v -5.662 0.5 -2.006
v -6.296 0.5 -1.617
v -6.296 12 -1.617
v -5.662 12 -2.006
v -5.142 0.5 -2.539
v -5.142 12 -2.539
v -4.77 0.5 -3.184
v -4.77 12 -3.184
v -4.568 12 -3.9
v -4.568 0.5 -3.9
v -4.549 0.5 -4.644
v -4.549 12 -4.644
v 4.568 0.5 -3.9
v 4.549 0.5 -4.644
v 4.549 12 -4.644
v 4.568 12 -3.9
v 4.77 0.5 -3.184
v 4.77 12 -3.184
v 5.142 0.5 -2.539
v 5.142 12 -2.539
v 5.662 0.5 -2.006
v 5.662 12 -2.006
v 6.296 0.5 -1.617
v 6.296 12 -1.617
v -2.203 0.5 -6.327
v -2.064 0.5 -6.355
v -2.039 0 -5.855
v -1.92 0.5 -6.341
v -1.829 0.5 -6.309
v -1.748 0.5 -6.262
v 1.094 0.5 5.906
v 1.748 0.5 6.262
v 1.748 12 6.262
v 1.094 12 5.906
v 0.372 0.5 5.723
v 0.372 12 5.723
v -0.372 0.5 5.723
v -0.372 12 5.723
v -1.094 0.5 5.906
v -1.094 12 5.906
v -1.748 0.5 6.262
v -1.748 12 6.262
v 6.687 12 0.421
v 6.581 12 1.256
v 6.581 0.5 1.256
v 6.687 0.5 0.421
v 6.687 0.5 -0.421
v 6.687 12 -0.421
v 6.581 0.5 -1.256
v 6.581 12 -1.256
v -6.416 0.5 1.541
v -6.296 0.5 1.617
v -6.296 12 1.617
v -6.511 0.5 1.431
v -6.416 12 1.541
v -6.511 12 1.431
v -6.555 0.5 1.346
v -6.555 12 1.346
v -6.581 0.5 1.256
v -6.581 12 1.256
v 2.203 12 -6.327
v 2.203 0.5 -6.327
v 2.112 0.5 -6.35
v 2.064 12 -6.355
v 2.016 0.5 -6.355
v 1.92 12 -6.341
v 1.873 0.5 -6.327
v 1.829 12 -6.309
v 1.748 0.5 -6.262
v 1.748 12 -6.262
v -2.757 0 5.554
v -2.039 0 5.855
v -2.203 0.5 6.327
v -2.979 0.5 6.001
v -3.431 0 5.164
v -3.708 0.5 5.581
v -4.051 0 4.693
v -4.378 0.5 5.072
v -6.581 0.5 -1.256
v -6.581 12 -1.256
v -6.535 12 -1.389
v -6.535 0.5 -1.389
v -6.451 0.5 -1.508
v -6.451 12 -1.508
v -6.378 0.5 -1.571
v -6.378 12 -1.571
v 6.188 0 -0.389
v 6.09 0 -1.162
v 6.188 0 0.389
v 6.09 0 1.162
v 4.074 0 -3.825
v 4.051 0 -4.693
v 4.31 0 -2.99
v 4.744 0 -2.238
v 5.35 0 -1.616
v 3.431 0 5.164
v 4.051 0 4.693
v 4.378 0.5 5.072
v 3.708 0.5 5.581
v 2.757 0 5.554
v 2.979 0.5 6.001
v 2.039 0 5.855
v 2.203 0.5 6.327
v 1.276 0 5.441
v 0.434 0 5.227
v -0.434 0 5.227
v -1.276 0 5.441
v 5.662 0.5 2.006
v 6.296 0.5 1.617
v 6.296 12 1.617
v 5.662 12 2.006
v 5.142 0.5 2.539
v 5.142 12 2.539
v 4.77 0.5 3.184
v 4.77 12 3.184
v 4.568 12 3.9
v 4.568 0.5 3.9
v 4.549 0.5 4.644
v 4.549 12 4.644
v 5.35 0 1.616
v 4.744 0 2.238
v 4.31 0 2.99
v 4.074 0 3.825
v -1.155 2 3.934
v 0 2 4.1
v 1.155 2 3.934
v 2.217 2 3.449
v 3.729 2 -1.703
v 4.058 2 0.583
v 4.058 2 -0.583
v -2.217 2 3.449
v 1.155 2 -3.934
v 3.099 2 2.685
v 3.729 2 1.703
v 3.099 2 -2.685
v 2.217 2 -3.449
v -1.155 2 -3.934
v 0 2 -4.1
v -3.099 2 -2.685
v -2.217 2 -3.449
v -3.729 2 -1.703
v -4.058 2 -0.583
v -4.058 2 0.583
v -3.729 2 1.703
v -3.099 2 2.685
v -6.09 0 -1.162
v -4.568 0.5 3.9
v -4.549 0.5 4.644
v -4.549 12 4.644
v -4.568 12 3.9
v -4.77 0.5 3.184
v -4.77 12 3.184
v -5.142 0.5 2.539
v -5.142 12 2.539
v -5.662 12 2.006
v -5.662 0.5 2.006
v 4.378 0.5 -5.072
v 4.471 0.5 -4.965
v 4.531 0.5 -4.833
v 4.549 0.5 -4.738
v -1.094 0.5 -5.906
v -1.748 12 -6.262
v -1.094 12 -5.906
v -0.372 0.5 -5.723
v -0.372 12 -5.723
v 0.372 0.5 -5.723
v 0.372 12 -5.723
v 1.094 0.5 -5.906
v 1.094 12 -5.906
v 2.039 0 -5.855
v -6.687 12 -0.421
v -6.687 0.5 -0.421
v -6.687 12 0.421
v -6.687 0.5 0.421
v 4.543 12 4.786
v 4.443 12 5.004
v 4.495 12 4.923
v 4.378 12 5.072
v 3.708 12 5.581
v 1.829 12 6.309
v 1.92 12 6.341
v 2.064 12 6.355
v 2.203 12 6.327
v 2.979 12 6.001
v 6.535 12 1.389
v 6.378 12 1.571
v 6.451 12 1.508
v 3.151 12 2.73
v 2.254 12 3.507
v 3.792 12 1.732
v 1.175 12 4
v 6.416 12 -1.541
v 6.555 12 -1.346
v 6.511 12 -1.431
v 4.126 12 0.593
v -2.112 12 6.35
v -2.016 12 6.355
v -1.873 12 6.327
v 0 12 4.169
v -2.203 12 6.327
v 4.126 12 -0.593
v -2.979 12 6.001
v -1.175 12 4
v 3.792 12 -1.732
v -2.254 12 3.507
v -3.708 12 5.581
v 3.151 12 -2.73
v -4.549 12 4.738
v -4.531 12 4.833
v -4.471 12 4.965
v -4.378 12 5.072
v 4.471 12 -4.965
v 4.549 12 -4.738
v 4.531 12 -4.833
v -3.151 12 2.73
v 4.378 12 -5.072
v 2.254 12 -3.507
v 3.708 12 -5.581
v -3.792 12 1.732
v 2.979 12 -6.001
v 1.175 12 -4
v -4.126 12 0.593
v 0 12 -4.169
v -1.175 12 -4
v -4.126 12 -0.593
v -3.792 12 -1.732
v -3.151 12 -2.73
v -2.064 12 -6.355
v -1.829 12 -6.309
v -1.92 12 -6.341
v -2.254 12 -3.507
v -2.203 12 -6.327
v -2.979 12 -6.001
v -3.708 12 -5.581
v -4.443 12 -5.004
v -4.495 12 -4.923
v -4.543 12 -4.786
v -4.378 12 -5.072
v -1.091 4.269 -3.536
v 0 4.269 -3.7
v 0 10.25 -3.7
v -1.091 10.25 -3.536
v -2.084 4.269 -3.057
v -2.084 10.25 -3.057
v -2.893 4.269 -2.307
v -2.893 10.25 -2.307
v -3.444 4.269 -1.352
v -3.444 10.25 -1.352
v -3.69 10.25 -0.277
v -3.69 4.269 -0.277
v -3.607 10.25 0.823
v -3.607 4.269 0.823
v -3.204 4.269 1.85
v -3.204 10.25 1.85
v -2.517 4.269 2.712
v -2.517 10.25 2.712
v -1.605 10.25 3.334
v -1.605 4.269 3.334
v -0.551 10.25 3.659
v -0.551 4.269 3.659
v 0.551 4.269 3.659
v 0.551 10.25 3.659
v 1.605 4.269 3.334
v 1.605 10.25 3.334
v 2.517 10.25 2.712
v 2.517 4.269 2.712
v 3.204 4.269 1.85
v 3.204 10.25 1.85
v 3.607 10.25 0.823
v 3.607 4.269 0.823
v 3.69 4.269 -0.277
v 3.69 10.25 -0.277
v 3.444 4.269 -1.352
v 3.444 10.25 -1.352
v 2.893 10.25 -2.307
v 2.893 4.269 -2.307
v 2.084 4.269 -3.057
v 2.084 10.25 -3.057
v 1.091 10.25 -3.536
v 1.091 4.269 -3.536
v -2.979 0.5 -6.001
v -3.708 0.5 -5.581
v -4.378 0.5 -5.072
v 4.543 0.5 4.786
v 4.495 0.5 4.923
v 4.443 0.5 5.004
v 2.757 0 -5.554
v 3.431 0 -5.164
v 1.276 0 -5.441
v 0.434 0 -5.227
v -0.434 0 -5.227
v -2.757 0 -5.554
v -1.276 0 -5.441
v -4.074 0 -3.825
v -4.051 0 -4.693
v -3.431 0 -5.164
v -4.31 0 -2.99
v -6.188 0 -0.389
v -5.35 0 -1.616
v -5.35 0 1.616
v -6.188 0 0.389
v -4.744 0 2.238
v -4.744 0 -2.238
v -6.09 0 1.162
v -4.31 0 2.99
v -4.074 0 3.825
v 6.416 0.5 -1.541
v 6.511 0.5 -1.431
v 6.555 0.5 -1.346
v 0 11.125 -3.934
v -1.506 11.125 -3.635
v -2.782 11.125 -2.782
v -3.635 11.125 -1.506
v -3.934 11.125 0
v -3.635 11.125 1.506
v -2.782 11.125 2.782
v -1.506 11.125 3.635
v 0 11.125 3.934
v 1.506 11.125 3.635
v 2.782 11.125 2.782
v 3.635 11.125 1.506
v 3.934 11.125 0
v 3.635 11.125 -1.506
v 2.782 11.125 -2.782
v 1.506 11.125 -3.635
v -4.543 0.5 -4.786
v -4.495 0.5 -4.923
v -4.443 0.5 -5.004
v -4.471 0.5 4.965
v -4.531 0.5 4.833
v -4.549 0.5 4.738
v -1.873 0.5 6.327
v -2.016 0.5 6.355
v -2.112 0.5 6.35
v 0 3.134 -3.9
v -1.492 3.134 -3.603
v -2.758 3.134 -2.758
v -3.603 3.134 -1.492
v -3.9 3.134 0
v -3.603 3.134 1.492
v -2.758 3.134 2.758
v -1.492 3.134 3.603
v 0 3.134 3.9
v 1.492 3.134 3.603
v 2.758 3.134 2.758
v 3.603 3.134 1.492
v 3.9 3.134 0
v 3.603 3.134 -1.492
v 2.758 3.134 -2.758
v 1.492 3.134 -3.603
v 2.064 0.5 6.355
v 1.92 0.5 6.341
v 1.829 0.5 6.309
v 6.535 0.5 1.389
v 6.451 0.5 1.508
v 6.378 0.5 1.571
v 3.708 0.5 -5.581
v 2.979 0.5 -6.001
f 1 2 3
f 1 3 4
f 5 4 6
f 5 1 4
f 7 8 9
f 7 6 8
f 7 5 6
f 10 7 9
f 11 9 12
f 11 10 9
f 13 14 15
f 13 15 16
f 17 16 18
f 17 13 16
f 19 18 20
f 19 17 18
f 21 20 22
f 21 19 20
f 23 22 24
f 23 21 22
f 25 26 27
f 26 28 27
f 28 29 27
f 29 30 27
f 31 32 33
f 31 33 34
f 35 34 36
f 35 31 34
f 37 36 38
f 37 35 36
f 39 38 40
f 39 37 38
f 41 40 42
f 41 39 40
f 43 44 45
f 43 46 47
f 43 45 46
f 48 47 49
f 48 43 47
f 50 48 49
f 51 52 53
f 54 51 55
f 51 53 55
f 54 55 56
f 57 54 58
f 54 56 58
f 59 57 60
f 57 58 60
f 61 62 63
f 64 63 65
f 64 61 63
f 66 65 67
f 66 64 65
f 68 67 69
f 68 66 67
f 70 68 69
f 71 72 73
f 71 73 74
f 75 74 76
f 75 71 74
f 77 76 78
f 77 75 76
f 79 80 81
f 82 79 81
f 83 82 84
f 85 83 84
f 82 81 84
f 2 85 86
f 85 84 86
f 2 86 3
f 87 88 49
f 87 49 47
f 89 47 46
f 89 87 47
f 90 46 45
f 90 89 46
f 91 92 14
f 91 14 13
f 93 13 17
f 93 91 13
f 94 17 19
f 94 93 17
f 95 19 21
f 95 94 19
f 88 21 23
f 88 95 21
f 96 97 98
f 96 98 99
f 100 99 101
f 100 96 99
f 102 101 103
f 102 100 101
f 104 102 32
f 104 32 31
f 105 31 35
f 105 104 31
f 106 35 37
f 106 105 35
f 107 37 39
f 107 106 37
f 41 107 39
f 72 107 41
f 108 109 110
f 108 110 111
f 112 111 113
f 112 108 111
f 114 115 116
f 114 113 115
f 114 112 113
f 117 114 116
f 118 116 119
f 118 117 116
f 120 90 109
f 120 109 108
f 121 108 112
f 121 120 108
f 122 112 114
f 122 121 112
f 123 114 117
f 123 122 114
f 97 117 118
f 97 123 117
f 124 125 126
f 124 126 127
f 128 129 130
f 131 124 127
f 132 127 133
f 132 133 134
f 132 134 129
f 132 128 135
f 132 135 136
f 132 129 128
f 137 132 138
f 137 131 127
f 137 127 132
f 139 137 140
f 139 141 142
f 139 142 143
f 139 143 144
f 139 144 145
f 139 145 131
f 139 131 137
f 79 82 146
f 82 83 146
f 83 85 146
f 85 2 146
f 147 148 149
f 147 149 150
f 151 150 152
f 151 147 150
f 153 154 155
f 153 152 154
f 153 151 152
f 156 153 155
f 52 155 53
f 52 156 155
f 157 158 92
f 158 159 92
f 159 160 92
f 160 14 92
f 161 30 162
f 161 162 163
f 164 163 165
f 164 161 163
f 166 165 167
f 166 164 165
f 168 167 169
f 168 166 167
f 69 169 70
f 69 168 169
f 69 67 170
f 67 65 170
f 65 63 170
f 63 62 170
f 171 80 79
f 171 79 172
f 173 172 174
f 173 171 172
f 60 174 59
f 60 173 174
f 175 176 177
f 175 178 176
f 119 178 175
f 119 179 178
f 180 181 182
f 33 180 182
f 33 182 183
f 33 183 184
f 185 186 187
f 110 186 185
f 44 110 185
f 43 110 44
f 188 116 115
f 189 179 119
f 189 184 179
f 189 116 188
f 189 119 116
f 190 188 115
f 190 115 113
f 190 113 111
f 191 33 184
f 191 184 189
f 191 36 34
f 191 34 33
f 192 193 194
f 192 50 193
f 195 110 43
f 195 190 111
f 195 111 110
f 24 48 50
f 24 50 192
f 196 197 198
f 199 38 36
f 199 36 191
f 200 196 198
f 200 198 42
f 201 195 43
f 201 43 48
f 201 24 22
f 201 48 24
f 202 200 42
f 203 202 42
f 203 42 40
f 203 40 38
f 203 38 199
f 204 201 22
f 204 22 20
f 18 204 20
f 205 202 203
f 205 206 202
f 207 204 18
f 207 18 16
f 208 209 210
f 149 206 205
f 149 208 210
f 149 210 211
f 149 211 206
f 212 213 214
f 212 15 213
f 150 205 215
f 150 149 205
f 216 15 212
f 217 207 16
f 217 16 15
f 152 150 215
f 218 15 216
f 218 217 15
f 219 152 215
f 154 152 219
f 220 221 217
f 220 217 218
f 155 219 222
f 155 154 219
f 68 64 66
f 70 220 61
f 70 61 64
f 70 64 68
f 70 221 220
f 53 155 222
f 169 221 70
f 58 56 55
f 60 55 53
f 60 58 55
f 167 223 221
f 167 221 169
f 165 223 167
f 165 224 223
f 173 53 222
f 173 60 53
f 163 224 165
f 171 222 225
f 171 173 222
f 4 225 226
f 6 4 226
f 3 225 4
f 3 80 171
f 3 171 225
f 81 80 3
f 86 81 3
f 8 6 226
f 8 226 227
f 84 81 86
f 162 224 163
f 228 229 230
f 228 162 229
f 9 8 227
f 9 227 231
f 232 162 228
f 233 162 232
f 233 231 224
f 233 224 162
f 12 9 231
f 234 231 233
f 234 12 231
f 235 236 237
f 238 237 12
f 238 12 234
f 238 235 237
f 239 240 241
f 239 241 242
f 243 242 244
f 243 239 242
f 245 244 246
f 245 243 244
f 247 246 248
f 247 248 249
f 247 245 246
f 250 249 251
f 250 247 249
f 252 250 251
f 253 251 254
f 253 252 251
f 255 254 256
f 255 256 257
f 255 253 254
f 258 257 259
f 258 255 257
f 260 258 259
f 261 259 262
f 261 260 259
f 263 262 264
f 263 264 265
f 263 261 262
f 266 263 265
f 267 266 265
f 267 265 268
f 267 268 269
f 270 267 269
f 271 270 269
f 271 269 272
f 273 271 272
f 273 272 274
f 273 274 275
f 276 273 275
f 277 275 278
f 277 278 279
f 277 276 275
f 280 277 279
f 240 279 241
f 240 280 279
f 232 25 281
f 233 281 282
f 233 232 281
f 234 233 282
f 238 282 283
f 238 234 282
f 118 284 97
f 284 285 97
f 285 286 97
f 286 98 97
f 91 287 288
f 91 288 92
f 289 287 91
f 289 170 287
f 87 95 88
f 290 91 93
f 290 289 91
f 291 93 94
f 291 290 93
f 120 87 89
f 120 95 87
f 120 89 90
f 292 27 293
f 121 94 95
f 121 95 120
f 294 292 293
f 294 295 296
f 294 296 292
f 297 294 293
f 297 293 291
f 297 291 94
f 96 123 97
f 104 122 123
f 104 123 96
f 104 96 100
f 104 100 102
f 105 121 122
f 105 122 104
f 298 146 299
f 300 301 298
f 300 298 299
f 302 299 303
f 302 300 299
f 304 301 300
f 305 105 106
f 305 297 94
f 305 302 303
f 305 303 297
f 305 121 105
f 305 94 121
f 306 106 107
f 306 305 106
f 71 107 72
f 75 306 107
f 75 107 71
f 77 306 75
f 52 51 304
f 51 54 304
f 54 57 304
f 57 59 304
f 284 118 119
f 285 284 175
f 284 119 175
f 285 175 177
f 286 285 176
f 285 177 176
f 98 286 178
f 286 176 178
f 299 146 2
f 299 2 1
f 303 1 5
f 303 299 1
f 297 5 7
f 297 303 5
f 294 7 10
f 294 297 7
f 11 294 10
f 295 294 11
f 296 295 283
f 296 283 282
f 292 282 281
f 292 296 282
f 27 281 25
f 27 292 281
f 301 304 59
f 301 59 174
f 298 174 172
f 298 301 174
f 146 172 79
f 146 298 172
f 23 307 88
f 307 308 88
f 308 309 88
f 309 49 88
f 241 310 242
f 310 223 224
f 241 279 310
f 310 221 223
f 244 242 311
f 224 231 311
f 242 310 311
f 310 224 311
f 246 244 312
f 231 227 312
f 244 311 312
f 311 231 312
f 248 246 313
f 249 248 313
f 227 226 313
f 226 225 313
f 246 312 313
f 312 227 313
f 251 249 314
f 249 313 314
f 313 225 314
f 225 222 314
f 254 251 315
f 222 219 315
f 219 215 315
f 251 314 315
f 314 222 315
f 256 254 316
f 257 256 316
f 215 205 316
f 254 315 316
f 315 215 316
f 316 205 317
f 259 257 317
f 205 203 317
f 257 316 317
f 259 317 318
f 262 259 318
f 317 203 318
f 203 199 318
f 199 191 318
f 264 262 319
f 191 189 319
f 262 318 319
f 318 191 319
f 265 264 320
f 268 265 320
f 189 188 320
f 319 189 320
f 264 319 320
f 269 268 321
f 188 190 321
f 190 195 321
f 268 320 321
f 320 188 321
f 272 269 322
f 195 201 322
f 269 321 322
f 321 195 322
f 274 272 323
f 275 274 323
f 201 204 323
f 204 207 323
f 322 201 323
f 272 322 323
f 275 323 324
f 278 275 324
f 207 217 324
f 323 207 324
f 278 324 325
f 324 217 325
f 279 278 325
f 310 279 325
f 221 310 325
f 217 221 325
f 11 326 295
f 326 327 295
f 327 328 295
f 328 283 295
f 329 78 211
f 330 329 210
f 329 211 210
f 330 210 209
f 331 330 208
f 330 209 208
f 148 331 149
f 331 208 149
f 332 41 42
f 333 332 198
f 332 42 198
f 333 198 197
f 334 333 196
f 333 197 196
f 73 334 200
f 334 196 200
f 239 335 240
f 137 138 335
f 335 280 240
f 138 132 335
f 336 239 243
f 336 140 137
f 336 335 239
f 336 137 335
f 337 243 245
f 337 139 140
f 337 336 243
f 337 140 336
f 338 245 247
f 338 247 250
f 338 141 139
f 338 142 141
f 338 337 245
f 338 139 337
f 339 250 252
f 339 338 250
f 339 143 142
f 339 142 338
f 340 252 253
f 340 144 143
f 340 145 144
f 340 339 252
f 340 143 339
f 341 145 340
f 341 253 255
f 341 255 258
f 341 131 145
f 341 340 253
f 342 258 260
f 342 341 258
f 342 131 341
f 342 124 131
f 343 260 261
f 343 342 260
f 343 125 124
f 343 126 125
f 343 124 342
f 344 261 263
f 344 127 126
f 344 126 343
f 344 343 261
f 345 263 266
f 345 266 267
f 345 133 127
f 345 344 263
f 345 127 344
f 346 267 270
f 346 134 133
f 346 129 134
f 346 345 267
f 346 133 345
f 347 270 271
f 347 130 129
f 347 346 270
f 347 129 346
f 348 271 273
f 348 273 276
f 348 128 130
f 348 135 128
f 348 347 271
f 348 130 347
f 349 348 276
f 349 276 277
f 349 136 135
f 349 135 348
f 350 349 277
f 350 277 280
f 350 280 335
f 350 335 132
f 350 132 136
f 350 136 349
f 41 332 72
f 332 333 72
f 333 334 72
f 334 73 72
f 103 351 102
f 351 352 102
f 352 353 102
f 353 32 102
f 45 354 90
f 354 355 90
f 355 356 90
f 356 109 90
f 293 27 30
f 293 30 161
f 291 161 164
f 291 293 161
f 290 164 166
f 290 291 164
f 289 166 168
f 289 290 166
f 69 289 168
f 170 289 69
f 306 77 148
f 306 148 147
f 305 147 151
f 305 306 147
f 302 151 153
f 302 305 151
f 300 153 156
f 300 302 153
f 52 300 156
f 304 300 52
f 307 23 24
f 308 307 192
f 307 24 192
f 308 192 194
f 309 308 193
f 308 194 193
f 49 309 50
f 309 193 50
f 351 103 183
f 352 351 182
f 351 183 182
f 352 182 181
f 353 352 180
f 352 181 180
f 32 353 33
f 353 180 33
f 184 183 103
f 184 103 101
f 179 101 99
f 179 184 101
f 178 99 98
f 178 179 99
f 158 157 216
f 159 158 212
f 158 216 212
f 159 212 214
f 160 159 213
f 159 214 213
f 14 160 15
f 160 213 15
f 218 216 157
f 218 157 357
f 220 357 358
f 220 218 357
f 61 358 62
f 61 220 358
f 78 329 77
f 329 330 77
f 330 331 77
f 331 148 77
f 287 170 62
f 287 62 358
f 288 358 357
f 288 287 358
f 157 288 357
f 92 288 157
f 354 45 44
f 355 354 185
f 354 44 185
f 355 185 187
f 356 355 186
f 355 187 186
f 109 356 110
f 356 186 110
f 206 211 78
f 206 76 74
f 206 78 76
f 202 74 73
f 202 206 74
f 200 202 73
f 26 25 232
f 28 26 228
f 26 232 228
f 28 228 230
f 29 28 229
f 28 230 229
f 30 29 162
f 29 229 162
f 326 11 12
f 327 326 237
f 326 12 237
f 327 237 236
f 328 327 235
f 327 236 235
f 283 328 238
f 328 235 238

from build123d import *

# Parameters (mm, degrees)
CHAMFER1_SIZE      = 1.75
CHAMFER1_SIZE2     = 0.468911087
SKETCH2_R          = 3
CUT_EXTRUDE1_DEPTH = 16.289865925
CIRPATTERN1_COUNT  = 6
FILLET1_R          = 0.5
CHAMFER2_SIZE      = 0.5


with BuildPart() as part:
    # Sketch1 → Revolve1 (revolve)
    with BuildSketch(Plane(origin=(0, 0, 0), x_dir=(0, 0, -1), z_dir=(1, 0, 0)), mode=Mode.PRIVATE) as revolve1_sk:
        Polygon((0, 0), (-6.7, 0), (-6.7, 12), (-3.7, 12), (-3.7, 4.268512728), (-4.1, 2), (0, 2), align=None)
    revolve(revolve1_sk.sketch.rotate(Axis((0, 0, 0), (0, 1, 0)), 180), axis=Axis((0, 0, 0), (0, 1, 0)))

    # Chamfer1
    chamfer1_edges = [part.edges().sort_by_distance(p)[0] for p in [
        (0, 12, 3.7),
    ]]
    chamfer1_side = [part.faces().sort_by_distance(p)[0] for p in [
        (0, 8.134256364, 3.7),
    ]]
    chamfer(chamfer1_edges, length=CHAMFER1_SIZE, length2=CHAMFER1_SIZE2, reference=chamfer1_side[0])

    # Sketch2 → Cut-Extrude1 (cut, through all)
    with BuildSketch(Plane(origin=(0, 0, 0), x_dir=(1, 0, 0), z_dir=(0, 1, 0))):
        with Locations((0, 8.7)):
            Circle(SKETCH2_R)
    cut_extrude1 = extrude(amount=CUT_EXTRUDE1_DEPTH, mode=Mode.SUBTRACT)

    # CirPattern1: Cut-Extrude1 ×6 about axis
    cirpattern1_axis = Axis((0, 0, 0), (0, 1, 0))
    for i in range(1, CIRPATTERN1_COUNT):
        add(cut_extrude1.rotate(cirpattern1_axis, i * 360 / CIRPATTERN1_COUNT), mode=Mode.SUBTRACT)

    # Fillet1
    fillet1_edges = [part.edges().sort_by_distance(p)[0] for p in [
        (1.941133962, 6, -6.412643678),
        (-1.941133962, 6, -6.412643678),
        (6.524079312, 6, -1.525250516),
        (4.58294535, 6, -4.887393162),
        (4.58294535, 6, 4.887393162),
        (6.524079312, 6, 1.525250516),
        (-1.941133962, 6, 6.412643678),
        (1.941133962, 6, 6.412643678),
        (-6.524079312, 6, 1.525250516),
        (-4.58294535, 6, 4.887393162),
        (-4.58294535, 6, -4.887393162),
        (-6.524079312, 6, -1.525250516),
    ]]
    fillet(fillet1_edges, radius=FILLET1_R)

    # Chamfer2
    chamfer2_edges = [part.edges().sort_by_distance(p)[0] for p in [
        (4.936344802, 0, -2.85),
        (6.7, 0, 0),
        (4.936344802, 0, 2.85),
        (3.35, 0, 5.802370205),
        (0, 0, 5.7),
        (-3.35, 0, 5.802370205),
        (-4.936344802, 0, 2.85),
        (-6.7, 0, 0),
        (-4.936344802, 0, -2.85),
        (-3.35, 0, -5.802370205),
        (0, 0, -5.7),
        (3.35, 0, -5.802370205),
        (-4.515588694, 0, -4.878854752),
        (4.515588694, 0, -4.878854752),
        (1.96741781, 0, -6.350041898),
        (-1.96741781, 0, -6.350041898),
        (-6.483006504, 0, -1.471187146),
        (-6.483006504, 0, 1.471187146),
        (-4.515588694, 0, 4.878854752),
        (-1.96741781, 0, 6.350041898),
        (1.96741781, 0, 6.350041898),
        (4.515588694, 0, 4.878854752),
        (6.483006504, 0, 1.471187146),
        (6.483006504, 0, -1.471187146),
    ]]
    chamfer(chamfer2_edges, length=CHAMFER2_SIZE - 0.0001)  # a hair under: the kernel refuses the full size


solid = part.part
